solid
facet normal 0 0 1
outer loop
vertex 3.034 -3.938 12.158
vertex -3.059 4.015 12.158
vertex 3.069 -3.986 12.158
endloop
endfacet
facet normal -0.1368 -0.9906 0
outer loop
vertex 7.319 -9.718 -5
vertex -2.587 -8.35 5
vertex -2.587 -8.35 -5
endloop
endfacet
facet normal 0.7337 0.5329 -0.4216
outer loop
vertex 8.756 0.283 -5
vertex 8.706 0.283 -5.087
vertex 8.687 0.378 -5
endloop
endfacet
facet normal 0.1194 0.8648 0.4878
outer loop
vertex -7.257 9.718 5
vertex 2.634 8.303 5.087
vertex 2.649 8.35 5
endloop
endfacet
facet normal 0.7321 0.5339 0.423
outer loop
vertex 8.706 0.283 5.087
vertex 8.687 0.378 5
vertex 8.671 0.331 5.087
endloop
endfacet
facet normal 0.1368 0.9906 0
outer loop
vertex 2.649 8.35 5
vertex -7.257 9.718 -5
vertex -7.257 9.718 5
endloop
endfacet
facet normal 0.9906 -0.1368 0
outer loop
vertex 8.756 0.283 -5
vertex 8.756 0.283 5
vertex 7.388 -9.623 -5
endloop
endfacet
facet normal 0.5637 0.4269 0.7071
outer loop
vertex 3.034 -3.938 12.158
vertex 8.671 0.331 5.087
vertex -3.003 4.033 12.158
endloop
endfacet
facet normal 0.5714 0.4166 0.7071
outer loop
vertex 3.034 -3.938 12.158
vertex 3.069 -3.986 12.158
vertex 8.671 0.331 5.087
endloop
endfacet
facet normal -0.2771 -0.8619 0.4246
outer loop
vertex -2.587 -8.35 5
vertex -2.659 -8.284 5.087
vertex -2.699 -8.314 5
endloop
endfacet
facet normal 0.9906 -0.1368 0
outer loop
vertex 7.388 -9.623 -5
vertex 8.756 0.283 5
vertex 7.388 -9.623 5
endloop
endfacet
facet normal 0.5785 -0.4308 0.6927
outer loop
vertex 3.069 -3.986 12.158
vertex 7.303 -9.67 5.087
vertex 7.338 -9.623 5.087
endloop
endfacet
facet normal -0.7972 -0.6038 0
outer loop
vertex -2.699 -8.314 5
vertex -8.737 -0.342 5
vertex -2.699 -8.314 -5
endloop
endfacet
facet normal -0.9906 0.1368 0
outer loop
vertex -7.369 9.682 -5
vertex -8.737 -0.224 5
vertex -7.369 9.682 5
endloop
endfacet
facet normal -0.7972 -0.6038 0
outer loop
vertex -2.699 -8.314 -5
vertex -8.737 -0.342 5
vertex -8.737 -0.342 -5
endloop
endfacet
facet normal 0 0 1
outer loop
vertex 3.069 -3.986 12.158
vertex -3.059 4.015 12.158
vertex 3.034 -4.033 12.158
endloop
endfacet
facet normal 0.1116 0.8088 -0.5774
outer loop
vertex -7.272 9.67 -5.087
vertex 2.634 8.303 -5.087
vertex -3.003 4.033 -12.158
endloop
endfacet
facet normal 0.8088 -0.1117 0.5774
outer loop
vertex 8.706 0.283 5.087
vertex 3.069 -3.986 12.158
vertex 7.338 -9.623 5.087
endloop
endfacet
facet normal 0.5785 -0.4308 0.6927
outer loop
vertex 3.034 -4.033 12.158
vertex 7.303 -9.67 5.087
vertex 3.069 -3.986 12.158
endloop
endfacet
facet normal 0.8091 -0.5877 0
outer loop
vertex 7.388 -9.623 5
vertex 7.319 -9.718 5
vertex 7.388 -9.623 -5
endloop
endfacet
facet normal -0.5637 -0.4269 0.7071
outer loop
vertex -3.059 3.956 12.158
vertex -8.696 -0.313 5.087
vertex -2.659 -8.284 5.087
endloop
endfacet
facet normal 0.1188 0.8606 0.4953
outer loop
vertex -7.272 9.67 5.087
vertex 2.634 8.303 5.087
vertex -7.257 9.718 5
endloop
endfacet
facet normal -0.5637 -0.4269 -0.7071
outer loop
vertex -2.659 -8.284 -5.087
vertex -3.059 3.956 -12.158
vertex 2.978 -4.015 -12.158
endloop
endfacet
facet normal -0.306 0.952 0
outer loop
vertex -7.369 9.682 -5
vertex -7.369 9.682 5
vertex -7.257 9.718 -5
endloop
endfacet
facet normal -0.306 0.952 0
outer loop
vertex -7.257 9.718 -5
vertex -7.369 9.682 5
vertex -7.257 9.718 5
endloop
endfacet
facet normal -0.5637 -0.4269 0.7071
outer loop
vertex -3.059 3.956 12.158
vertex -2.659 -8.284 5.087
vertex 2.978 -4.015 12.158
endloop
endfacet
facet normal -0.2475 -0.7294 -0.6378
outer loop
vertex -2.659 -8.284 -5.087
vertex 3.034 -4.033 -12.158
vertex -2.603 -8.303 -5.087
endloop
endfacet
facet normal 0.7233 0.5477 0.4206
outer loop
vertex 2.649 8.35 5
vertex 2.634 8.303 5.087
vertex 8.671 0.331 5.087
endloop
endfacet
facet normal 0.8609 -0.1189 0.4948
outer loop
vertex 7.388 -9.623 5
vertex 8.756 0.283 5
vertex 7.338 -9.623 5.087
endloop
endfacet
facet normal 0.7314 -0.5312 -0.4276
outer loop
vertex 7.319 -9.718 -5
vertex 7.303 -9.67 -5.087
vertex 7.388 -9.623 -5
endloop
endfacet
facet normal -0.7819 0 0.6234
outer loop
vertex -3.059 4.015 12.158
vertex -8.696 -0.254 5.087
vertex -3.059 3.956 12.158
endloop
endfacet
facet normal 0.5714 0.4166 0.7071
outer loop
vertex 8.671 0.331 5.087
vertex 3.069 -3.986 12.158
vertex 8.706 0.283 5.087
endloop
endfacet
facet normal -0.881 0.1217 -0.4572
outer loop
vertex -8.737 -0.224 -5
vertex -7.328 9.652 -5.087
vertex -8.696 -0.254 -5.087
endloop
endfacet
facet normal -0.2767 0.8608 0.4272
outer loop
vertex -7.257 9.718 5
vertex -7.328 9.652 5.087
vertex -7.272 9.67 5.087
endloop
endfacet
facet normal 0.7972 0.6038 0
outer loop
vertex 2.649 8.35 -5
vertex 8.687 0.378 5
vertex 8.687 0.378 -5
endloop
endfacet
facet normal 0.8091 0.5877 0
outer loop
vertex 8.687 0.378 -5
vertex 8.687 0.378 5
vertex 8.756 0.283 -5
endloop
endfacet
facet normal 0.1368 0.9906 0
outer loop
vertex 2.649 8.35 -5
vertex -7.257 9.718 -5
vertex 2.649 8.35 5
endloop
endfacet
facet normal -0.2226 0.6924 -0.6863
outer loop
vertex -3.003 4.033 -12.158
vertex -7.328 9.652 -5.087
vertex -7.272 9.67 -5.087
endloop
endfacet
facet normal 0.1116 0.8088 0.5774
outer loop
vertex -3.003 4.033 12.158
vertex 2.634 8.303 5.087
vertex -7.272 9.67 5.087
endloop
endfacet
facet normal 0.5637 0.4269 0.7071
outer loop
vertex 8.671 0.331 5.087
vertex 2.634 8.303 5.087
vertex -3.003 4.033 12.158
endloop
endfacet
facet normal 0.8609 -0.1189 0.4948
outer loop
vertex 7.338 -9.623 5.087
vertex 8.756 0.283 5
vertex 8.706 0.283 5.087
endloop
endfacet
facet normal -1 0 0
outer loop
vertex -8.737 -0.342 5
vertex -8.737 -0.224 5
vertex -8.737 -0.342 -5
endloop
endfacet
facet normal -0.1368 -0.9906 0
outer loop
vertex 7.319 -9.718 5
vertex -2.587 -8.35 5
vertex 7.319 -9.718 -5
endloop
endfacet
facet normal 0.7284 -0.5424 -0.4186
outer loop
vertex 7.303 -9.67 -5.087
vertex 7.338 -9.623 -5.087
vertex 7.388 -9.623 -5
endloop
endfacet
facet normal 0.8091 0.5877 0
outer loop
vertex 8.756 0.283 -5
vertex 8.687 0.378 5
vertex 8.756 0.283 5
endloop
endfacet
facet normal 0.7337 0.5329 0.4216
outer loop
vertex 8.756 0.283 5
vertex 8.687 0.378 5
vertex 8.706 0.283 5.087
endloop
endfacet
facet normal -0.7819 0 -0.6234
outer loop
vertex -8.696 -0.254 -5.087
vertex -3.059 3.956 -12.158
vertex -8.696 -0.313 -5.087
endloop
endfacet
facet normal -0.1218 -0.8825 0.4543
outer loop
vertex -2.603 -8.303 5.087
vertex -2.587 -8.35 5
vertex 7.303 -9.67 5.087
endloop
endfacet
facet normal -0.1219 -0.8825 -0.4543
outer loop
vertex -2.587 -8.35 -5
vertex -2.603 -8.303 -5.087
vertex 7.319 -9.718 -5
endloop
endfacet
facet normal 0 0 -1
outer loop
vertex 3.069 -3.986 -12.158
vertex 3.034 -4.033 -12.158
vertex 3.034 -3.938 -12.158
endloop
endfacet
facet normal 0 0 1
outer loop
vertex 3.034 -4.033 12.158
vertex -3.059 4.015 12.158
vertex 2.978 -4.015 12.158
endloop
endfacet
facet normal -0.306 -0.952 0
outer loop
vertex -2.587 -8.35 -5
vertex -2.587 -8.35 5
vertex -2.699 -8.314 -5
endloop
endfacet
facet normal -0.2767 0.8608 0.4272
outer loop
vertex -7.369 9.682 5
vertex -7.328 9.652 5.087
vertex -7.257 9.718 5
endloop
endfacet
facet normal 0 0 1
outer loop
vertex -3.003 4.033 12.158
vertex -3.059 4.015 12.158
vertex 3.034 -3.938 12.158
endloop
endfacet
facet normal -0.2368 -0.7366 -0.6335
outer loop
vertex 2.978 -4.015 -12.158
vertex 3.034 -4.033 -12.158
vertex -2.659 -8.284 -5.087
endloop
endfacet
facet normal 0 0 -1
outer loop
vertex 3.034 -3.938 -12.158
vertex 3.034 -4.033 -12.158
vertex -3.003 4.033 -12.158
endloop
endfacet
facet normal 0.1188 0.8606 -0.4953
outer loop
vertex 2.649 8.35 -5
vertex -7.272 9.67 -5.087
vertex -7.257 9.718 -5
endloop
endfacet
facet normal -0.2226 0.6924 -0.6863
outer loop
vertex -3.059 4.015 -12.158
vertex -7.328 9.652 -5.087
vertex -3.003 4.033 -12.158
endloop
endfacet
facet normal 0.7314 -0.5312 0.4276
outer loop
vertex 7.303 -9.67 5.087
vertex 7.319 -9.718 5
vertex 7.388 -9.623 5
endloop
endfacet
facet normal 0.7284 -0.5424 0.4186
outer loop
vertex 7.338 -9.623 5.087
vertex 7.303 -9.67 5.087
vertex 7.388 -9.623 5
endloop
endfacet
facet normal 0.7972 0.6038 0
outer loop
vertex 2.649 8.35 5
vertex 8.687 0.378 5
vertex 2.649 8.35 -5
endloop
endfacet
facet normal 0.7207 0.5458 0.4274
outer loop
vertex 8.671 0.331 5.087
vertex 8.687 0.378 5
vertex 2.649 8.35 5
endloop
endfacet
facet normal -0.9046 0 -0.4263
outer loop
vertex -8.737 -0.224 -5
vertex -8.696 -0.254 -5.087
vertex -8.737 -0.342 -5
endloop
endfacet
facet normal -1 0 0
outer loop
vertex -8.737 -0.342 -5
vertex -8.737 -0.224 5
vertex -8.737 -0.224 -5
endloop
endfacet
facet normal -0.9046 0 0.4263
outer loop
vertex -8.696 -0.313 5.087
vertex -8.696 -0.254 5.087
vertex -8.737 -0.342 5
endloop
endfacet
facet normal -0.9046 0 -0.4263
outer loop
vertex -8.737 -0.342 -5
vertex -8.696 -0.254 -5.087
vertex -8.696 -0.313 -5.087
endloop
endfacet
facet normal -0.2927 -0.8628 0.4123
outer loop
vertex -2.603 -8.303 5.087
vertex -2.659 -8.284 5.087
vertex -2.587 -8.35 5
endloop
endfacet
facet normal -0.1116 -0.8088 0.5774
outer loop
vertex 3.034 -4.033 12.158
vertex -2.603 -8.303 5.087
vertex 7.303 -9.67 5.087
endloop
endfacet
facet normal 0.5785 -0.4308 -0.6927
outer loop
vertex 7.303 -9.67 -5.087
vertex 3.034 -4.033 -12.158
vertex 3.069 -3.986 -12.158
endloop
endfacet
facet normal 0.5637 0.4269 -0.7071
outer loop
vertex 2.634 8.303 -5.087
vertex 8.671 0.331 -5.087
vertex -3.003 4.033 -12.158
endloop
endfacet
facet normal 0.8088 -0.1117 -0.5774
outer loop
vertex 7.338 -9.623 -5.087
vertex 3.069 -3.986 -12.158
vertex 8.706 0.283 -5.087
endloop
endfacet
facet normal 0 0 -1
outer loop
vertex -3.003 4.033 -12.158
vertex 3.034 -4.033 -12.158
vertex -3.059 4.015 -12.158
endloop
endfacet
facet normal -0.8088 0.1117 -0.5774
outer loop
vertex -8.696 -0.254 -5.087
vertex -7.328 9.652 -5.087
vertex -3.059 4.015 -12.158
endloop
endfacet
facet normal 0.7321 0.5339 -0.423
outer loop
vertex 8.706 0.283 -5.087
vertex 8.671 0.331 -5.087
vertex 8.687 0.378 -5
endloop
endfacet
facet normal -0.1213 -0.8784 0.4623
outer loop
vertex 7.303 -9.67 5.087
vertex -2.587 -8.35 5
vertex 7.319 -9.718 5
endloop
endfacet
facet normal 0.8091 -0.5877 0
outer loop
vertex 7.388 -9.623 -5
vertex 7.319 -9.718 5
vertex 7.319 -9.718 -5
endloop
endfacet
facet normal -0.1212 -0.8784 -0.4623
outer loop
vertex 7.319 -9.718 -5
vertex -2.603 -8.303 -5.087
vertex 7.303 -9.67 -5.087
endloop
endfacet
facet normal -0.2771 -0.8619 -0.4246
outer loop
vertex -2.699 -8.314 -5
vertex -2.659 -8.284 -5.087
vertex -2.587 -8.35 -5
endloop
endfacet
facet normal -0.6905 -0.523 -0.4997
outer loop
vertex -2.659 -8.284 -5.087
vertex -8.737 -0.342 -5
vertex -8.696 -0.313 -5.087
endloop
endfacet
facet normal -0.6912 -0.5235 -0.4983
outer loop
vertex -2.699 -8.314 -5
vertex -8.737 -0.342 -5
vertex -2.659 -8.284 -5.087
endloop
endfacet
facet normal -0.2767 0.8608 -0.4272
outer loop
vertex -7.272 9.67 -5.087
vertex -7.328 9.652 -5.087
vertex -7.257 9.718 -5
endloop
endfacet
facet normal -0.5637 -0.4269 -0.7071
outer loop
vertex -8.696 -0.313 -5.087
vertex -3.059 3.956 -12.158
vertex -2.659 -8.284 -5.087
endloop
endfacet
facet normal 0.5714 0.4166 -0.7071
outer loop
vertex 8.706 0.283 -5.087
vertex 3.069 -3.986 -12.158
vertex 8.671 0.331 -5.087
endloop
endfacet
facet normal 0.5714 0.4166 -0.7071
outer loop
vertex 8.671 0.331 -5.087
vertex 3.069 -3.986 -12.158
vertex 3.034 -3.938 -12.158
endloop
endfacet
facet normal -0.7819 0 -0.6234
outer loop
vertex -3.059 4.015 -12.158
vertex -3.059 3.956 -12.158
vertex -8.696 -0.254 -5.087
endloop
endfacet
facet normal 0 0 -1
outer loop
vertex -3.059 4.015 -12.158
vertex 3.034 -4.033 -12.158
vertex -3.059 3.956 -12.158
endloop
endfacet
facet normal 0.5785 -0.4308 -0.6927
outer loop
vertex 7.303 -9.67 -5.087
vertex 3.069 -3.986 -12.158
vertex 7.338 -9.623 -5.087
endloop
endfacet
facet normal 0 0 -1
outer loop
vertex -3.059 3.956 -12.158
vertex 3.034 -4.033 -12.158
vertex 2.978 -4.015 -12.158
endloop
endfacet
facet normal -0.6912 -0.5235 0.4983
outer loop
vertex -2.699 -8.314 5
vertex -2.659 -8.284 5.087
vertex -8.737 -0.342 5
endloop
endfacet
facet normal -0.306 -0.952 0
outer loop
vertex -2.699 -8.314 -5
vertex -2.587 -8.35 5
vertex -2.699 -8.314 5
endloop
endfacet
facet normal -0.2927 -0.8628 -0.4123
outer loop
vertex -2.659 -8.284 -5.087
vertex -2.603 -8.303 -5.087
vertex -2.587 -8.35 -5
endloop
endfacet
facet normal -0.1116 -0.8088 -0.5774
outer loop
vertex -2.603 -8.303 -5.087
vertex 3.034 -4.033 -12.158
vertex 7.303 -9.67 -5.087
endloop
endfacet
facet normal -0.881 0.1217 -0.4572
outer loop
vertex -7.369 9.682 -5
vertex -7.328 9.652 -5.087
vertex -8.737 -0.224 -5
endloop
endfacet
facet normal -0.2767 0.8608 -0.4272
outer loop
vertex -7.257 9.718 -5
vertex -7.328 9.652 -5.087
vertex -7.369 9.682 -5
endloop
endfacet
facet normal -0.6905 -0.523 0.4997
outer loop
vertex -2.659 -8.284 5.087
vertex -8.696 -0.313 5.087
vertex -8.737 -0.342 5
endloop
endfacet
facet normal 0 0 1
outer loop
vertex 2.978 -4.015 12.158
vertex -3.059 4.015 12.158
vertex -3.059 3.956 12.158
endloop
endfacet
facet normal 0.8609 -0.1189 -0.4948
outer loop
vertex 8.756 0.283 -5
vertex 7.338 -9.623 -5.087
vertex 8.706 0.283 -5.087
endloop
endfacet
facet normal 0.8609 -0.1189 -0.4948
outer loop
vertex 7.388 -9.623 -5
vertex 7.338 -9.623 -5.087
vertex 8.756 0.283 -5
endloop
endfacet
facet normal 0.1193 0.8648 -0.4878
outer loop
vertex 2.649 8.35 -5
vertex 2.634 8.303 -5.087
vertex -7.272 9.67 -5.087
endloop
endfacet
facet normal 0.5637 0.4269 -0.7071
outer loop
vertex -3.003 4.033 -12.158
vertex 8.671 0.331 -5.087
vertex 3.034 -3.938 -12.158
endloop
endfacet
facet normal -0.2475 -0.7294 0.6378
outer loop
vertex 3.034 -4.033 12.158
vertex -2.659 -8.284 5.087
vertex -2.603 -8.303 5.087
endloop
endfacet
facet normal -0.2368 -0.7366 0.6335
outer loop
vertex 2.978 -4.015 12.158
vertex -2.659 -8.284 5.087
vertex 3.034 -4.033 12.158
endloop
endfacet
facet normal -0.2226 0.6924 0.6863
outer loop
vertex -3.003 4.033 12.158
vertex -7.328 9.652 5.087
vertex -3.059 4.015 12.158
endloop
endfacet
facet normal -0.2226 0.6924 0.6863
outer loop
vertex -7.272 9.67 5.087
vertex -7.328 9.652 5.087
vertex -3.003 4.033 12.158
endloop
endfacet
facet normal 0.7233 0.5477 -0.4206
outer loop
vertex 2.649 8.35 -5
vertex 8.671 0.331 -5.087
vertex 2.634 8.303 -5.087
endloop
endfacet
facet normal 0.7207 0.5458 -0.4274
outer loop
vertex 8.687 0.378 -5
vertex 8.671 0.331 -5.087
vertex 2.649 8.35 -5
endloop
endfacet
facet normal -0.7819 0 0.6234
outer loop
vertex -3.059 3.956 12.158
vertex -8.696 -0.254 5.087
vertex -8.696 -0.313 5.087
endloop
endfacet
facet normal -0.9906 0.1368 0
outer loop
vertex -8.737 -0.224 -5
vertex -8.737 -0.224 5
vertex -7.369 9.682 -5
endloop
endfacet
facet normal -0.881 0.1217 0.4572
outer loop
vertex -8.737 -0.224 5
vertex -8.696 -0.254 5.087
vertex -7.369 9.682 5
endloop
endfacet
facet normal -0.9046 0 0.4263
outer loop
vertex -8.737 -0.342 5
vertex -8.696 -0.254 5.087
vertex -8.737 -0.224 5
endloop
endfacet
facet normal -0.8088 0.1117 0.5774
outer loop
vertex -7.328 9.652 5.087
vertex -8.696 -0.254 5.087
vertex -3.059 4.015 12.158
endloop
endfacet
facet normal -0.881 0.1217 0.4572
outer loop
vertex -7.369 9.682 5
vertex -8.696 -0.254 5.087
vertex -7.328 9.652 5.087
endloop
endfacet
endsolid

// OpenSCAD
// Auto-generated OpenSCAD file
    shift = 0.01;

    inner_points = 10*[[0.7287883694352655, -0.9622755809862549, 0.4999999999999998], [0.728788369435265, -0.9622755809862551, -0.5000000000000002], [-0.728788369435265, 0.9622755809862551, 0.5000000000000002], [-0.7287883694352655, 0.9622755809862549, -0.4999999999999998], [0.30187402671986113, -0.3985875963849562, 1.2071067811865475], [0.3018740267198599, -0.39858759638495667, -1.2071067811865475], [-0.3018740267198599, 0.39858759638495667, 1.2071067811865475], [-0.30187402671986113, 0.3985875963849562, -1.2071067811865475], [-0.26181395788143796, -0.8255019391003613, 0.5000000000000002], [0.8655620113211595, 0.02832674633044846, 0.49999999999999956], [-0.2618139578814384, -0.8255019391003613, -0.4999999999999998], [0.8655620113211591, 0.028326746330448405, -0.5000000000000004], [-0.8655620113211591, -0.028326746330448405, 0.5000000000000004], [0.2618139578814384, 0.8255019391003613, 0.4999999999999998], [-0.8655620113211595, -0.02832674633044846, -0.49999999999999956], [0.26181395788143796, 0.8255019391003613, -0.5000000000000002]];

    outer_points_unshifted = 10*[[-0.5696478499849842, -0.4314281054603697, -1.093836321399554], [-0.960592326979208, 0.4314281054603697, -0.7734590825338425], [0.960592326979208, -0.4314281054603697, 0.7734590825338425], [0.5696478499849842, 0.4314281054603697, 1.093836321399554], [0.1549886117537691, -1.0415595833913545, -0.7734590782057024], [-0.7888348467405426, 1.0415595833913545, -3.0604573320047734e-09], [0.7888348467405426, -1.0415595833913545, 3.0604573320047734e-09], [-0.1549886117537691, 1.0415595833913545, 0.7734590782057024], [-0.5933626113683385, -0.7888348480349219, -0.16018861993246514], [0.3504608533757889, -0.07402136288581751, -0.9336477001994059], [-0.9843070883625624, 0.07402136288581751, 0.1601886189332462], [-0.04048362361843505, 0.7888348480349219, -0.6132704613336946], [0.04048362361843505, -0.7888348480349219, 0.6132704613336946], [0.9843070883625624, -0.07402136288581751, -0.1601886189332462], [-0.3504608533757889, 0.07402136288581751, 0.9336477001994059], [0.5933626113683385, 0.7888348480349219, 0.16018861993246514]];
    outer_points = [for (p = outer_points_unshifted) [p[0], p[1], p[2] + shift]];
    // Convex hull for inner set (I)
    module inner_hull() {
        hull() {
            for (p = inner_points) {
                translate(p) sphere(r=0.1);
            }
        }
    }

    // Convex hull for outer set (O) minus inner hull (O \ I)
    module outer_minus_inner() {
        difference() {
            hull() {
                for (p = outer_points) {
                    translate(p) sphere(r=0.1);
                }
            }
            inner_hull(); // Subtract inner hull
        }
    }

    // Convex hull for outer set (O) minus all translated inner hulls
    module outer_minus_AllTranslationInner() {
        difference() {
            hull() {
                for (p = outer_points) {
                    translate(p) sphere(r=0.1);
                }
            }
            hull() {
                translate([0,0,50]) inner_hull();
                translate([0,0,-50]) inner_hull();
            }; // Subtract translated inner hulls
        }
    }

    // Difference between outer_minus_inner and outer_minus_AllTranslationInner
    module outer_minus_inner_diff() {
        difference() {
            // Outer minus inner
            difference() {
                hull() {
                    for (p = outer_points) {
                        translate(p) sphere(r=0.1);
                    }
                }
                inner_hull();
            }

            // Subtract Outer minus AllTranslationInner
            difference() {
                hull() {
                    for (p = outer_points) {
                        translate(p) sphere(r=0.1);
                    }
                }
                hull() {
                    translate([0,0,50]) inner_hull();
                    translate([0,0,-50]) inner_hull();
                };
            }
        }
    }

    // Rendering all with colors applied
    color([1, 0, 0, 0.5]) inner_hull(); // Transparent red
    // color([0, 1, 0, 1]) outer_minus_AllTranslationInner(); // Opaque green
    // color([1, 1, 0, 1]) outer_minus_inner_diff(); // Opaque yellow
    
